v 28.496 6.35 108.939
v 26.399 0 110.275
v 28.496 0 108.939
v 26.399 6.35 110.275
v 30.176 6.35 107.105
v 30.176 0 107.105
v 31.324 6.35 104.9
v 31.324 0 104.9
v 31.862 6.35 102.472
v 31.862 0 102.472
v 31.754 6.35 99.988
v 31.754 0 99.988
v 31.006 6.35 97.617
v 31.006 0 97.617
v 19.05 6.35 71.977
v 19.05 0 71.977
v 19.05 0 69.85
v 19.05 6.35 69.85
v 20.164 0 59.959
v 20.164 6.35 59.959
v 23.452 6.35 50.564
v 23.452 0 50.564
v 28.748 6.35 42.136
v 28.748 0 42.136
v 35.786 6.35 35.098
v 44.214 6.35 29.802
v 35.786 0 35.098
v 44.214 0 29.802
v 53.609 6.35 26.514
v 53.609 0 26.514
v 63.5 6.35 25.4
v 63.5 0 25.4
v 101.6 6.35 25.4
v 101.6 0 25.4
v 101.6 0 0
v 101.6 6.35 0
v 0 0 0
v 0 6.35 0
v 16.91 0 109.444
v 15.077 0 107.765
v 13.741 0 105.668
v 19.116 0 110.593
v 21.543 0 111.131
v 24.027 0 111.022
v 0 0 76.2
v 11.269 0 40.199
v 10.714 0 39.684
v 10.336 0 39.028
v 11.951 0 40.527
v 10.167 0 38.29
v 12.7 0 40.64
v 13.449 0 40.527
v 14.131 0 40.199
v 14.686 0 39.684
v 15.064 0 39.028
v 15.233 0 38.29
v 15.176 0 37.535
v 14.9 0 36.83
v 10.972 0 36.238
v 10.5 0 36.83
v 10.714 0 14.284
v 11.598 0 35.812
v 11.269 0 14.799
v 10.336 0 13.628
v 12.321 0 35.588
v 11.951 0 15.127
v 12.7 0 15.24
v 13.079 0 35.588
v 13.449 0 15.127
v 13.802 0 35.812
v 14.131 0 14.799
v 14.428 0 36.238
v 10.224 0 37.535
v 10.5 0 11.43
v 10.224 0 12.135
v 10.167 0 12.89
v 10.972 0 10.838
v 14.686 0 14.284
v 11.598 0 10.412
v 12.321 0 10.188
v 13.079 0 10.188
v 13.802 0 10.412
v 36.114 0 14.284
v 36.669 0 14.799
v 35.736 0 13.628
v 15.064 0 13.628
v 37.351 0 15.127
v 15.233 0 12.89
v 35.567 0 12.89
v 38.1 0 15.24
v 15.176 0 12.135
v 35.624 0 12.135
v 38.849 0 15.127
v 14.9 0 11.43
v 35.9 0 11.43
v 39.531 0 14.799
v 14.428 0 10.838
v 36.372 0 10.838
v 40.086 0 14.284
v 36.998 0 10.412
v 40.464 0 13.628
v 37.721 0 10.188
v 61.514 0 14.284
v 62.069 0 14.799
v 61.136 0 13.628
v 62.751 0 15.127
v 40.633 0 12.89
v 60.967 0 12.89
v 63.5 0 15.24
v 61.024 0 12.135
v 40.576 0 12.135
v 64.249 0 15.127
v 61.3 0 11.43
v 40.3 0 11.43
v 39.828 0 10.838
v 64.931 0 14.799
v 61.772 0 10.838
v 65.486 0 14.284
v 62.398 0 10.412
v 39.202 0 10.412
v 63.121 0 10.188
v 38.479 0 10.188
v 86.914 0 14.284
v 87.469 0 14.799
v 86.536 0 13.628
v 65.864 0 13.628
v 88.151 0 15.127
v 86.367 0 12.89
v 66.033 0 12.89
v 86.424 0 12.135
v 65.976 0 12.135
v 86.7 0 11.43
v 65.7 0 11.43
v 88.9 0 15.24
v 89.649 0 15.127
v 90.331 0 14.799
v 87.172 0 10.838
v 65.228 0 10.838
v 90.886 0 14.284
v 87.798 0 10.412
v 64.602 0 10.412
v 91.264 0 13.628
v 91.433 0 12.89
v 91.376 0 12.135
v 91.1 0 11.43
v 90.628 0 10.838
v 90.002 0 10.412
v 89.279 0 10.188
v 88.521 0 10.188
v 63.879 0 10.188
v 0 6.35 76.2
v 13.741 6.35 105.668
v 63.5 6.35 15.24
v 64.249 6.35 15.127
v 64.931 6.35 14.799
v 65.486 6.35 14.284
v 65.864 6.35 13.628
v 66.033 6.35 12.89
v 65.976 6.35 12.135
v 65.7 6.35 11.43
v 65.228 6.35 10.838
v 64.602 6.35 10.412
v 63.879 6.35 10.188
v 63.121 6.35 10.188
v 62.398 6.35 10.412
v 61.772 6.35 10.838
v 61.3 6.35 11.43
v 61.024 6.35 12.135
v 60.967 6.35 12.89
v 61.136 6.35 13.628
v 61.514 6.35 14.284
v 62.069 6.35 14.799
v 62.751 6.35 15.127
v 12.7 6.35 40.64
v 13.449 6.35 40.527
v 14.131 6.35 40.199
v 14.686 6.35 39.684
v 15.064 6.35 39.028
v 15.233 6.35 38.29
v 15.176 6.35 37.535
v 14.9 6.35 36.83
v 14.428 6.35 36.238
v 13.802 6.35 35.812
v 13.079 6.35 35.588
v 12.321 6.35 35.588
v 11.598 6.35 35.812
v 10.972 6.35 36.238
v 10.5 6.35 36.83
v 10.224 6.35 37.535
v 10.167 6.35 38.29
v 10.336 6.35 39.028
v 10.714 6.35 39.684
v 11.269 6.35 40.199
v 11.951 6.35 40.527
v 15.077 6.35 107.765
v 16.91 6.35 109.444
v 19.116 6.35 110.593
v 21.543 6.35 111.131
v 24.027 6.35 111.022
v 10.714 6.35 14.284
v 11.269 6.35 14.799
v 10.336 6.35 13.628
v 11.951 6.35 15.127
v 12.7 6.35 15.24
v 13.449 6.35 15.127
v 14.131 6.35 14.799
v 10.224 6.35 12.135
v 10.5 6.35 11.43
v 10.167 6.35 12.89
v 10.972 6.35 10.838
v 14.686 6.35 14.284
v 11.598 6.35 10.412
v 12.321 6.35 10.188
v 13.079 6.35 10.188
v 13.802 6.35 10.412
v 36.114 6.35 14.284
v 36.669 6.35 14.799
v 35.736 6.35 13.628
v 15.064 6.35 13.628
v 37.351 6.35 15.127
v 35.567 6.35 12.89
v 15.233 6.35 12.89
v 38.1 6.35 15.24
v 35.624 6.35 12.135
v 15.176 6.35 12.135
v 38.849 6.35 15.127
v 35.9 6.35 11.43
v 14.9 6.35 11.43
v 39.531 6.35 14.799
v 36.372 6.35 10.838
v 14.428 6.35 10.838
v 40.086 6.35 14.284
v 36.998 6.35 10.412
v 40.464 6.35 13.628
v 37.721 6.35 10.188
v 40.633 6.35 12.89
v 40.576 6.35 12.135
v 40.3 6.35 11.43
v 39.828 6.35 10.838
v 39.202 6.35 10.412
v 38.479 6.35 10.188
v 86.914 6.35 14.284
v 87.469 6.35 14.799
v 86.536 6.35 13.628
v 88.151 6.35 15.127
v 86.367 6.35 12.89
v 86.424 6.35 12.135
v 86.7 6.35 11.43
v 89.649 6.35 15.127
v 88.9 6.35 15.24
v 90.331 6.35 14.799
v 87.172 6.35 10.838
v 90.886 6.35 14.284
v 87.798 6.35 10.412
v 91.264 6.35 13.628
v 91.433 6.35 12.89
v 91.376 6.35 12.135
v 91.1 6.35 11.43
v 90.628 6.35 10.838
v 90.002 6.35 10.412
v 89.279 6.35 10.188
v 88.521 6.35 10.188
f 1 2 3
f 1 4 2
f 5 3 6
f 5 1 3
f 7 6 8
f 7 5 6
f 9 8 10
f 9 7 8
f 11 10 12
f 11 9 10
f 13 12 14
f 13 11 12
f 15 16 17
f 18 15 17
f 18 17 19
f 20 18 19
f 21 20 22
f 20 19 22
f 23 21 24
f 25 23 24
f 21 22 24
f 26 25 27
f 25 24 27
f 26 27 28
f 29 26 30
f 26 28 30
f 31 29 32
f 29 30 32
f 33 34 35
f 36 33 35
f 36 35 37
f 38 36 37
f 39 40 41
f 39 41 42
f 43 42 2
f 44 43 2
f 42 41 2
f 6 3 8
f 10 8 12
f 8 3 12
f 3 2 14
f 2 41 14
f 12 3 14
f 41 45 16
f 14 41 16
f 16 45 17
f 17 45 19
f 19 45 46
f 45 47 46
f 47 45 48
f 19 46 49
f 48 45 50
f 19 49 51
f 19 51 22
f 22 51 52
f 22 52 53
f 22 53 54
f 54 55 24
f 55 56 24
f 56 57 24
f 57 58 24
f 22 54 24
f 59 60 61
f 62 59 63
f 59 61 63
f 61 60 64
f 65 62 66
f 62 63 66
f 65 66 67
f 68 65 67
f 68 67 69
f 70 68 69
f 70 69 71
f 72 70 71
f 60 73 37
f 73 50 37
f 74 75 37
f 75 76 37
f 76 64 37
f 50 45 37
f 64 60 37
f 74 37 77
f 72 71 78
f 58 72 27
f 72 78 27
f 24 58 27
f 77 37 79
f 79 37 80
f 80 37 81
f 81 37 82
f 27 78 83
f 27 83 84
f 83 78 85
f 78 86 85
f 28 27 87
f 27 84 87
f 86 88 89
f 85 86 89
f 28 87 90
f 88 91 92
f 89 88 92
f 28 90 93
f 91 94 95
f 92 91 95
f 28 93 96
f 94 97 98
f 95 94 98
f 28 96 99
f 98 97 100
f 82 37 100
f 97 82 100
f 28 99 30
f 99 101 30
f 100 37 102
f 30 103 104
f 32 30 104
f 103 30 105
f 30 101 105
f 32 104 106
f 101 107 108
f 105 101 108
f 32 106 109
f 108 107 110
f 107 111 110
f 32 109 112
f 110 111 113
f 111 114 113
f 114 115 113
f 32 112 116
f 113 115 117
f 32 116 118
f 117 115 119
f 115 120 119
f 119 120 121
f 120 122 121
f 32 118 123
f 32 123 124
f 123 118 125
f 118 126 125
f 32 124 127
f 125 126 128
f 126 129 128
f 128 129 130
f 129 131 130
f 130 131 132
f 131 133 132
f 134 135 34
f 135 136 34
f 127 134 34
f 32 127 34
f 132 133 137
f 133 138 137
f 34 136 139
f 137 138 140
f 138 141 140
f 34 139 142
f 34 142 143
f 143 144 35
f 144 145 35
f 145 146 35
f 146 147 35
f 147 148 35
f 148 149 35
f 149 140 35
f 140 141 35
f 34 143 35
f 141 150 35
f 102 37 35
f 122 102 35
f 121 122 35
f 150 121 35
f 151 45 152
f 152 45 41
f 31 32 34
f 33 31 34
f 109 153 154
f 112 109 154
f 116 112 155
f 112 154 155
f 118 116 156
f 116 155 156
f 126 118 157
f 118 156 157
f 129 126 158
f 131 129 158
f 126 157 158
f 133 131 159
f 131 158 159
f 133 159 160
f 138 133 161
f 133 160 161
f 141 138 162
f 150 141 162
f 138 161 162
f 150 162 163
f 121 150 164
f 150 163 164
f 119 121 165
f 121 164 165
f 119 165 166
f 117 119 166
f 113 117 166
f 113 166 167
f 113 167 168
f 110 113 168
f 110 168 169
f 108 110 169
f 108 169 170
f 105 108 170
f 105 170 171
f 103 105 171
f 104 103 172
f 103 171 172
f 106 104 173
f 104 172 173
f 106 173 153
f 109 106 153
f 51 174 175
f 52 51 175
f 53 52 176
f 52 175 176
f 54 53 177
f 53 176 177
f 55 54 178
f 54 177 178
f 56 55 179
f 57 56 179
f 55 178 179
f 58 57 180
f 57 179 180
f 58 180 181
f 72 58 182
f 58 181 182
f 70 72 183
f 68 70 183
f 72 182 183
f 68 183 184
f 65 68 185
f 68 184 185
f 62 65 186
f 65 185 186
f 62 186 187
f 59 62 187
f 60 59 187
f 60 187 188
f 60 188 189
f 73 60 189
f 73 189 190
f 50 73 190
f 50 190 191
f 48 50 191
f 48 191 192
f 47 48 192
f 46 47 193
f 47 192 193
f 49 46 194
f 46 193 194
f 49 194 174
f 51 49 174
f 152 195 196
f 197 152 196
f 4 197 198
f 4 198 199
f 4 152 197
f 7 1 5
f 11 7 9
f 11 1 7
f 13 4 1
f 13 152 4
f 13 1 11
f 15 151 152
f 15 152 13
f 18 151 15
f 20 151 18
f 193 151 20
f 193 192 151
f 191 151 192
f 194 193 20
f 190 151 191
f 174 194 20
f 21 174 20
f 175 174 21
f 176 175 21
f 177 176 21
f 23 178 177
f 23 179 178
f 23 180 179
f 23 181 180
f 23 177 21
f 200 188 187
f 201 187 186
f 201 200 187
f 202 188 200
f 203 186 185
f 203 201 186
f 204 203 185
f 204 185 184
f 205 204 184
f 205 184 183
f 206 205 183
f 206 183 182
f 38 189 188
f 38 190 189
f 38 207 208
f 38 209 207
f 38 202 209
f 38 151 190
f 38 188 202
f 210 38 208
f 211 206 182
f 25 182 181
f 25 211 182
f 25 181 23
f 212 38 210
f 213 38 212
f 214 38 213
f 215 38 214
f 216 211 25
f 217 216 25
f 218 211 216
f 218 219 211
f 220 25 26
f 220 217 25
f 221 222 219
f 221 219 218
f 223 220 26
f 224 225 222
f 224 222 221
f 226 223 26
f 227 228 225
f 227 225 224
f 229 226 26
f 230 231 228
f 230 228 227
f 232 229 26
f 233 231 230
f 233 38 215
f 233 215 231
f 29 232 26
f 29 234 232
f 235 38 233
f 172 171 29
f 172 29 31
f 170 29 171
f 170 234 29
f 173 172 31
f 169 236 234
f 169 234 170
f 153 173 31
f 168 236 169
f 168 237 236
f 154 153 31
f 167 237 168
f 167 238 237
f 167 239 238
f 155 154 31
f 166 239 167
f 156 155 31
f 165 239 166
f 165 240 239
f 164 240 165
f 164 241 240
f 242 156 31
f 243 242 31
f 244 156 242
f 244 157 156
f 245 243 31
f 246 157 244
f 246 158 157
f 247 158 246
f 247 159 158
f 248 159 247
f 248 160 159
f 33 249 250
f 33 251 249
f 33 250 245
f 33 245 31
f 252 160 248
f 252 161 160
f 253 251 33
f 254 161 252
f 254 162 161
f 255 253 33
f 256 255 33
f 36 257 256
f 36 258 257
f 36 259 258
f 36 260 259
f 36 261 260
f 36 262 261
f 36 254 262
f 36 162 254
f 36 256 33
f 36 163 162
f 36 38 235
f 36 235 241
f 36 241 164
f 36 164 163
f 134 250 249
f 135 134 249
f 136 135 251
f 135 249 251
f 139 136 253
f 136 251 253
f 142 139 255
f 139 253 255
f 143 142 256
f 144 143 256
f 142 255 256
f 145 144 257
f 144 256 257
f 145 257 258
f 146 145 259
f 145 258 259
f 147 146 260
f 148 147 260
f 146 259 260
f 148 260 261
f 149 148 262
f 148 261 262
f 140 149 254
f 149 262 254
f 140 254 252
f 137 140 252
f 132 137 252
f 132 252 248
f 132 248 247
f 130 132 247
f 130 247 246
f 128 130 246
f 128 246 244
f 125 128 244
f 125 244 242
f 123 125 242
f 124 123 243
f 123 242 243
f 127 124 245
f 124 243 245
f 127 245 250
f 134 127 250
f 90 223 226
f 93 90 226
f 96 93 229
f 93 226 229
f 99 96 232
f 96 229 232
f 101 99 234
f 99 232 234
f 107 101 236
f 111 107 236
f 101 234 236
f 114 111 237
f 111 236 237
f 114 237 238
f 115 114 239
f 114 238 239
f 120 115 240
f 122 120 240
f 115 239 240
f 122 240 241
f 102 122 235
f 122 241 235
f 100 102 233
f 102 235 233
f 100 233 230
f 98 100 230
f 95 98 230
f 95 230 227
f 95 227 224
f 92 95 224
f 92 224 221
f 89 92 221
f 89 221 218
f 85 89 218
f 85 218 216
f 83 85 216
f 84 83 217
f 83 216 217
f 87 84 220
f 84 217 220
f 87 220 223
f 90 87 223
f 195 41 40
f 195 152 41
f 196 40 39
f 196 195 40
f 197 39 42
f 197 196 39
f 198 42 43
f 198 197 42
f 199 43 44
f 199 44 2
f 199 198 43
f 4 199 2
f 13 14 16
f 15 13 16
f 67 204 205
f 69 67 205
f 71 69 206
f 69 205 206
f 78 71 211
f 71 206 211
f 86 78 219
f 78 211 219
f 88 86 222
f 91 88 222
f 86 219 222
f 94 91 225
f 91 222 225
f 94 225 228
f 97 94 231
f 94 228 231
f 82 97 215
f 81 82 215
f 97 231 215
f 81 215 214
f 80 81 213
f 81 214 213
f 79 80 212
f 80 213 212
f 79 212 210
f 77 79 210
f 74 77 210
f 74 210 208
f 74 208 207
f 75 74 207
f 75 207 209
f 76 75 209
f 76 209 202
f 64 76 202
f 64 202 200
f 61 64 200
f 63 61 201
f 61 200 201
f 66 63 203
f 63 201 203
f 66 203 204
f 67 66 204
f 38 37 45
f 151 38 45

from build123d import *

# Parameters (mm, degrees)
BOSS_EXTRUDE1_DEPTH = 6.35
SKETCH2_R           = 2.54
CUT_EXTRUDE1_DEPTH  = 6.35
FILLET1_R           = 9.525


with BuildPart() as part:
    # Sketch1 → Boss-Extrude1 (new body)
    with BuildSketch(Plane(origin=(0, 0, 0), x_dir=(1, 0, 0), z_dir=(0, 1, 0))):
        with BuildLine():
            Line((0, 0), (0, -76.2))
            Line((0, -76.2), (17.766321776, -114.3))
            Line((17.766321776, -114.3), (35.031485119, -106.249122114))
            Line((35.031485119, -106.249122114), (19.05, -71.976716677))
            Line((19.05, -71.976716677), (19.05, -69.85))
            ThreePointArc((19.05, -69.85), (32.069103576, -38.419103576), (63.5, -25.4))
            Line((63.5, -25.4), (101.6, -25.4))
            Line((101.6, -25.4), (101.6, 0))
            Line((101.6, 0), (0, 0))
        make_face()
    extrude(amount=BOSS_EXTRUDE1_DEPTH)

    # Sketch2 → Cut-Extrude1 (cut)
    with BuildSketch(Plane(origin=(0, 6.35, 0), x_dir=(1, 0, 0), z_dir=(0, 1, 0))):
        with Locations(Location((12.7, -12.7, 0), (0, 0, 270))):
            Circle(SKETCH2_R)
        with Locations(Location((38.1, -12.7, 0), (0, 0, 270))):
            Circle(SKETCH2_R)
        with Locations(Location((63.5, -12.7, 0), (0, 0, 270))):
            Circle(SKETCH2_R)
        with Locations(Location((88.9, -12.7, 0), (0, 0, 270))):
            Circle(SKETCH2_R)
        with Locations((114.3, -12.7)):
            Circle(SKETCH2_R)
        with Locations((139.7, -12.7)):
            Circle(SKETCH2_R)
        with Locations(Location((12.7, -38.1, 0), (0, 0, 270))):
            Circle(SKETCH2_R)
    extrude(amount=-CUT_EXTRUDE1_DEPTH, mode=Mode.SUBTRACT)

    # Fillet1
    fillet1_edges = [part.edges().sort_by_distance(p)[0] for p in [
        (17.766321776, 3.175, 114.3),
        (35.031485119, 3.175, 106.249122114),
    ]]
    fillet(fillet1_edges, radius=FILLET1_R - 0.0001)  # a hair under: the kernel refuses the full size


solid = part.part
